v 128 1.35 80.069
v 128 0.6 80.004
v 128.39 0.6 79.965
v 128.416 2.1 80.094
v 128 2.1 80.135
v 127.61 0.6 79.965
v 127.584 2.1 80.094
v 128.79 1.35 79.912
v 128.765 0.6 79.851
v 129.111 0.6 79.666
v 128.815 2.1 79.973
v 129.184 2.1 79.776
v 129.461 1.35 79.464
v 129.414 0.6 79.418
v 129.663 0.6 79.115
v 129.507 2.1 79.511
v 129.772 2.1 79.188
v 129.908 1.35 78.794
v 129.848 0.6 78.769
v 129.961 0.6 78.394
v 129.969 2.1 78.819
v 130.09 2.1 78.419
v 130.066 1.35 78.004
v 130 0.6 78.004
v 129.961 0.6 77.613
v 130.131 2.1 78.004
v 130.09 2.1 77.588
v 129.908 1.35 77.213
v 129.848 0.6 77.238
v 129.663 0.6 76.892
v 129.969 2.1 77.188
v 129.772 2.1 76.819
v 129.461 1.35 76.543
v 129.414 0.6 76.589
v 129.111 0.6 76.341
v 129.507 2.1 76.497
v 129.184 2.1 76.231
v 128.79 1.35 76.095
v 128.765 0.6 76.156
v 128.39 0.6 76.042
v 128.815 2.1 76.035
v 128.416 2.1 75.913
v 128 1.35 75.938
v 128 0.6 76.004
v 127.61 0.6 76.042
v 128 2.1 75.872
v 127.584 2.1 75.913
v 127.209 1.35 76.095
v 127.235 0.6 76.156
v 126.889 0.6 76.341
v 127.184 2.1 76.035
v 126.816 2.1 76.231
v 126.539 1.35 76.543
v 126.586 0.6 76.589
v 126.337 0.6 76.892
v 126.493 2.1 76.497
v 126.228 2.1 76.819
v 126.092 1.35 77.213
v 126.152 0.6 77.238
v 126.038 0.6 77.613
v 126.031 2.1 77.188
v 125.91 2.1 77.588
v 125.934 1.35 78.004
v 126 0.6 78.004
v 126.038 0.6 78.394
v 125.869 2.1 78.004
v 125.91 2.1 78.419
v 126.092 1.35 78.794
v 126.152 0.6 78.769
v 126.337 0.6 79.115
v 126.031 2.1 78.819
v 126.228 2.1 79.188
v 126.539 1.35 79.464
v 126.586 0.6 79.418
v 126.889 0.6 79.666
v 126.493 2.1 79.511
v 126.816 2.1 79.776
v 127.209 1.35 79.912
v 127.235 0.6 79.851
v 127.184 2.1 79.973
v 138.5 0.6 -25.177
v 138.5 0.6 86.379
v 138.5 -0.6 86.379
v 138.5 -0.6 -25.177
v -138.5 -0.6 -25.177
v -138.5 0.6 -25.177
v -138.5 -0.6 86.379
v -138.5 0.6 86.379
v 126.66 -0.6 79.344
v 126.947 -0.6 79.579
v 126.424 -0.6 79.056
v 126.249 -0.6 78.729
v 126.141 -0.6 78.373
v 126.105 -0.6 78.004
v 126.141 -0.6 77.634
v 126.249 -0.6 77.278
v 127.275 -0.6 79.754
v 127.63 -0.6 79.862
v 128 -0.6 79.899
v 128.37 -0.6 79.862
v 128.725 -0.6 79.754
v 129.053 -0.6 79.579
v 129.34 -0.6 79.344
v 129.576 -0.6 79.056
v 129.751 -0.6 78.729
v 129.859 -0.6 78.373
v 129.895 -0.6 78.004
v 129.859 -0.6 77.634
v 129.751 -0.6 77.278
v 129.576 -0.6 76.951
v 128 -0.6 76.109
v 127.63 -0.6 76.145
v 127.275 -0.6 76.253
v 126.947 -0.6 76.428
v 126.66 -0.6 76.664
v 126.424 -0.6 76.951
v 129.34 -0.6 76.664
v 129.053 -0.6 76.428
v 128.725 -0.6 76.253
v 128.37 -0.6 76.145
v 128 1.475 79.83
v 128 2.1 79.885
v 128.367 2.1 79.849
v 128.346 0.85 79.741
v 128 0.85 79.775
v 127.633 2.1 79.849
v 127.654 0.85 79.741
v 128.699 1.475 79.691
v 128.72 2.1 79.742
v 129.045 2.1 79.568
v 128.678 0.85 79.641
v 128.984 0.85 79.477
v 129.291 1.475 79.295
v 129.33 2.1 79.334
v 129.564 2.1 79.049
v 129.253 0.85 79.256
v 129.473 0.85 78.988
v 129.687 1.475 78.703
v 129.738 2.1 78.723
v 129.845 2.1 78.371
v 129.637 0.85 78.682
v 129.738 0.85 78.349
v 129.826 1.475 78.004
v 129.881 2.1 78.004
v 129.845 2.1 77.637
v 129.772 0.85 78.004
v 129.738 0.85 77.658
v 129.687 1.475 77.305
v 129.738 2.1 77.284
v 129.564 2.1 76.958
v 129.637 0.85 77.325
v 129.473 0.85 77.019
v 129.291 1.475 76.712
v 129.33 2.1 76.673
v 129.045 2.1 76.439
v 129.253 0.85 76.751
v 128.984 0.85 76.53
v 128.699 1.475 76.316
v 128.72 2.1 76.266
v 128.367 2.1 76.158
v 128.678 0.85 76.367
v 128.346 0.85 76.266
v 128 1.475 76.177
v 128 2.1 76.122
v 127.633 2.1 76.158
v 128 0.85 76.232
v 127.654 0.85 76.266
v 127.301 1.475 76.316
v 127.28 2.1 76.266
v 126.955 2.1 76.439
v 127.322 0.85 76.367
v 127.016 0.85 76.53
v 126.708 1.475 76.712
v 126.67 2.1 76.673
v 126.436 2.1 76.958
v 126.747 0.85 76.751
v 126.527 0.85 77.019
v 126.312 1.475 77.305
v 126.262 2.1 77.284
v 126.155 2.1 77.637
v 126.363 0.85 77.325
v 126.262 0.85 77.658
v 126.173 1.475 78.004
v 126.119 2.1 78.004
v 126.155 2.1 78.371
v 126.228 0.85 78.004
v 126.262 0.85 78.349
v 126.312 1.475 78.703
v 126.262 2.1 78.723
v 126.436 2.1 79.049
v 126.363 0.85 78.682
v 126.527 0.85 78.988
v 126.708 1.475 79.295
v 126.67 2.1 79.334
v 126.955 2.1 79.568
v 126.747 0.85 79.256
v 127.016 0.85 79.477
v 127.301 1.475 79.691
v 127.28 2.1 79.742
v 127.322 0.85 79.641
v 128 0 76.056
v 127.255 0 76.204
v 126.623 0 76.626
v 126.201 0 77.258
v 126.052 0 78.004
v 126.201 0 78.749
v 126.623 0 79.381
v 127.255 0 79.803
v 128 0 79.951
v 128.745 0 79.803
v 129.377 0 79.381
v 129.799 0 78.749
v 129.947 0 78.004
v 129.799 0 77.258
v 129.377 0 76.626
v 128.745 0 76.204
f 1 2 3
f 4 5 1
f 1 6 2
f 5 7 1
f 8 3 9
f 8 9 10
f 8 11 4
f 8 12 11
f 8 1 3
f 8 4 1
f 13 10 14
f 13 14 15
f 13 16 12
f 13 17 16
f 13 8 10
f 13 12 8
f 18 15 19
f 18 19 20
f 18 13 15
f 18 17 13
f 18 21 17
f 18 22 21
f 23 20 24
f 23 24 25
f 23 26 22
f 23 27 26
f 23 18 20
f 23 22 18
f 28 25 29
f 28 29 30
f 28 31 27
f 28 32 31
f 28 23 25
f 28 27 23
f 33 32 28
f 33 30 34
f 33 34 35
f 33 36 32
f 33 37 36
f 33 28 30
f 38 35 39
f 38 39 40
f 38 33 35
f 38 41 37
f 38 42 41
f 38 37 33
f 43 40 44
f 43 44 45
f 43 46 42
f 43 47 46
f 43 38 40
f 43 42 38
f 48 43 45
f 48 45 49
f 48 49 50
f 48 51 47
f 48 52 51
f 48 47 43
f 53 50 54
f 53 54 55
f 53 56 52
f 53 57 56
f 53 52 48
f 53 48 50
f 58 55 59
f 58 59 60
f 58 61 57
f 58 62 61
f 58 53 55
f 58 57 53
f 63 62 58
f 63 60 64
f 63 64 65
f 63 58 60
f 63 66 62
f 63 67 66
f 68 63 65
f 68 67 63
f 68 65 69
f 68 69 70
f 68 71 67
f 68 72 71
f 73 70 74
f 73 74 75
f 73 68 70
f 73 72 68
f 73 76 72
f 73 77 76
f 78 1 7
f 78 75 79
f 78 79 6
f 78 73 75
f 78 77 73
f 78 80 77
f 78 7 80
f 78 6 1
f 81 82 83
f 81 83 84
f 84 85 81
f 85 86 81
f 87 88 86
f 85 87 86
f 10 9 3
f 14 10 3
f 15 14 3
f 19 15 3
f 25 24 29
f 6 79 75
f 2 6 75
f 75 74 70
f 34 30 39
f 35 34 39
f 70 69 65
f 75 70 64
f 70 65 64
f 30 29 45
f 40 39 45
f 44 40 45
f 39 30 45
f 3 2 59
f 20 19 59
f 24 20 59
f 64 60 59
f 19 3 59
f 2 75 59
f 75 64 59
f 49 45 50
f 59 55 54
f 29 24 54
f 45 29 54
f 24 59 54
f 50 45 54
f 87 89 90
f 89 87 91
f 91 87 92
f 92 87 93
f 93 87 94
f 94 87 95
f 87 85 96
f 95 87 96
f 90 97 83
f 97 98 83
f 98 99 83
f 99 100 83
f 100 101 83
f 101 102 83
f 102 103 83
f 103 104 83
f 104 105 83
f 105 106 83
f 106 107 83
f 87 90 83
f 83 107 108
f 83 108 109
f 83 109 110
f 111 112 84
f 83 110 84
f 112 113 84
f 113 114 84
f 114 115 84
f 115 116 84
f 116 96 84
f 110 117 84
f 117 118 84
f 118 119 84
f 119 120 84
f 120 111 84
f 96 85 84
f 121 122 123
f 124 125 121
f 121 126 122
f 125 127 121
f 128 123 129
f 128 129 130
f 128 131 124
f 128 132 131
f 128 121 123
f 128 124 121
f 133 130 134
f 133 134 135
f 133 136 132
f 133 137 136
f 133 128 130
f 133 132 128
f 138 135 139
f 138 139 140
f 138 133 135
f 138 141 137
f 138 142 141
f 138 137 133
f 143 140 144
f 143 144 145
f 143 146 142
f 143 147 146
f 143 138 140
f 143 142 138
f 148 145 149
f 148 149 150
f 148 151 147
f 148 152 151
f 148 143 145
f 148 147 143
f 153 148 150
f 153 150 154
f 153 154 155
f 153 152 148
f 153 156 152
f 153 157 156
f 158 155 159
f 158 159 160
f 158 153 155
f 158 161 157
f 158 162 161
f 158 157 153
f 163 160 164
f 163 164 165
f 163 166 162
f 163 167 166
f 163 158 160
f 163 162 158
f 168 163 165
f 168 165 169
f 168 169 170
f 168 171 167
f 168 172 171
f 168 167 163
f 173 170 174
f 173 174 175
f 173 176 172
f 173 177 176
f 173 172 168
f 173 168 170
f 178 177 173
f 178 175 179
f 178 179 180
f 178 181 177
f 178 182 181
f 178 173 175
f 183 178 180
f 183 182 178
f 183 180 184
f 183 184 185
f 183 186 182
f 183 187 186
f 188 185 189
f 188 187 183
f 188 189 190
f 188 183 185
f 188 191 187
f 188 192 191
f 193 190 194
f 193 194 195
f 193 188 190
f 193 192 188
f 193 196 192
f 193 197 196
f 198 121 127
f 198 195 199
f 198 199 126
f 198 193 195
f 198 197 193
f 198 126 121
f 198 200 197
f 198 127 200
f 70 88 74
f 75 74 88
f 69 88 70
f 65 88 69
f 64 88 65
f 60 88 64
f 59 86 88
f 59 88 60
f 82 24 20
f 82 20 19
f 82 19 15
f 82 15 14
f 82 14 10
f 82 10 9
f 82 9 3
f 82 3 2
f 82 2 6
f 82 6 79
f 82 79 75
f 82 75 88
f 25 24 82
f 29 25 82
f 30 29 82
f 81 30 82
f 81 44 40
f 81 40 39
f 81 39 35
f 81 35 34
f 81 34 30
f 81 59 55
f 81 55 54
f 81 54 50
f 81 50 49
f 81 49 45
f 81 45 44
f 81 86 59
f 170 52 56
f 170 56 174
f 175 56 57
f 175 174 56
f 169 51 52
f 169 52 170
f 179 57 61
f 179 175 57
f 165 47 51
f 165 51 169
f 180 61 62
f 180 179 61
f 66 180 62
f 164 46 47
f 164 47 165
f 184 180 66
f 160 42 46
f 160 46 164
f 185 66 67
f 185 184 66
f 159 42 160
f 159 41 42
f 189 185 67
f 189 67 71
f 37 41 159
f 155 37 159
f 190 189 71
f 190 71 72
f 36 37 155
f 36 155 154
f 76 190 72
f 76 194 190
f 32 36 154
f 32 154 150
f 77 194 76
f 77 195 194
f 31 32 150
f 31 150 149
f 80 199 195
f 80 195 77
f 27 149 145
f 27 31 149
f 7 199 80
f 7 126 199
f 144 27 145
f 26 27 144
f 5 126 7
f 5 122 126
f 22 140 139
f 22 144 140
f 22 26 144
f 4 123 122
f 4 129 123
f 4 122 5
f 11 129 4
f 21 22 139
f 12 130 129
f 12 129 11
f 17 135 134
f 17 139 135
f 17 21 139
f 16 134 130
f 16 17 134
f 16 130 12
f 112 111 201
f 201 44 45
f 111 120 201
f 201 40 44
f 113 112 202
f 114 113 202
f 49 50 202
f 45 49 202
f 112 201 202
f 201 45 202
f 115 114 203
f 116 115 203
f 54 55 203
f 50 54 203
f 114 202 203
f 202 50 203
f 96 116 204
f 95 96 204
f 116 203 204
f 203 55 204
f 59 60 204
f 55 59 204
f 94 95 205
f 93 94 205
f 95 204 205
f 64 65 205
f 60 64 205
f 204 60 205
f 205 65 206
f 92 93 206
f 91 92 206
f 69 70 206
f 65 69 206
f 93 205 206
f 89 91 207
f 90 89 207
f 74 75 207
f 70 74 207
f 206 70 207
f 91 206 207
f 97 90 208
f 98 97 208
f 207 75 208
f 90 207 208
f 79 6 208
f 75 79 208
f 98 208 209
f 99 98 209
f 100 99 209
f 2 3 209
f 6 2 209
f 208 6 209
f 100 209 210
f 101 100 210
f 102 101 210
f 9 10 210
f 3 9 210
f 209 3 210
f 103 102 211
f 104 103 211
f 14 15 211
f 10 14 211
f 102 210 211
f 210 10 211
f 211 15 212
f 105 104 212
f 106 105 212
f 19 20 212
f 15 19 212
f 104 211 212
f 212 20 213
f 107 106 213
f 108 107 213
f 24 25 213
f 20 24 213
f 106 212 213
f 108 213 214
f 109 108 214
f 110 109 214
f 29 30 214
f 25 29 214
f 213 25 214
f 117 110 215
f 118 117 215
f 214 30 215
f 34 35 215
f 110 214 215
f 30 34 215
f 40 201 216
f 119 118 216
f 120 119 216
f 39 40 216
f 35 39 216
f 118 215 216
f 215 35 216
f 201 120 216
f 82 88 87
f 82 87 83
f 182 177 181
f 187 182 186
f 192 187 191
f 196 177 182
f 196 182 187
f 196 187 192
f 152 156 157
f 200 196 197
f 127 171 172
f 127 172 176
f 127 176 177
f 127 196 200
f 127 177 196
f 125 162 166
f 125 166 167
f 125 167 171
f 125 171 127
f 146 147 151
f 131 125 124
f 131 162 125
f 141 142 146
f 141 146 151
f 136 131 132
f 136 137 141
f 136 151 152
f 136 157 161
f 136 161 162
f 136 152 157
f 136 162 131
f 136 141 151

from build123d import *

# Parameters (mm, degrees)
SKETCH1_W           = 276.99982026
SKETCH1_H           = 111.55517974
BOSS_EXTRUDE1_DEPTH = 0.6


with BuildPart() as part:
    # Sketch1 → Boss-Extrude1 (new, symmetric)
    with BuildSketch(Plane(origin=(0, 0, 0), x_dir=(1, 0, 0), z_dir=(0, 1, 0))):
        with Locations((-1.3e-07, -30.600952381)):
            Rectangle(SKETCH1_W, SKETCH1_H)
    extrude(amount=BOSS_EXTRUDE1_DEPTH, both=True)

    # Sketch2 → Revolve1 (revolve)
    with BuildSketch(Plane(origin=(0, 0, 78.003542251), x_dir=(-1, 0, 0), z_dir=(0, 0, -1)), mode=Mode.PRIVATE) as revolve1_sk:
        Polygon((-127.99991, 0.6), (-125.99991, 0.6), (-125.868677005, 2.1), (-126.118677005, 2.1), (-126.228037834, 0.85), (-127.99991, 0.85), align=None)
    revolve(revolve1_sk.sketch.rotate(Axis((127.99991, -51.532801272, 78.003542251), (0, 1, 0)), 90), axis=Axis((127.99991, -51.532801272, 78.003542251), (0, 1, 0)))

    # Sketch4 → Cut-Revolve1 (revolve, cut)
    with BuildSketch(Plane(origin=(0, 0, 78.003542251), x_dir=(-1, 0, 0), z_dir=(0, 0, -1)), mode=Mode.PRIVATE) as cut_revolve1_sk:
        Polygon((-129.894923604, -0.6), (-129.99991, 0.6), (-127.99991, 0.6), (-127.99991, -0.6), align=None)
    revolve(cut_revolve1_sk.sketch.rotate(Axis((127.99991, -51.532801272, 78.003542251), (0, 1, 0)), 90), axis=Axis((127.99991, -51.532801272, 78.003542251), (0, 1, 0)), mode=Mode.SUBTRACT)


with BuildPart() as cut_revolve1_piece_1:
    # of the separate pieces the step leaves, piece 1, a body of its own (cut_revolve1_pieces)
    add(part.part.solids().sort_by_distance((138.49991, -0.6, 86.378542251))[0])


with BuildPart() as cut_revolve1_piece_2:
    # of the separate pieces the step leaves, piece 2, a body of its own (cut_revolve1_pieces)
    add(part.part.solids().sort_by_distance((127.99991, 2.1, 80.134775246))[0])


solid = Compound([cut_revolve1_piece_1.part, cut_revolve1_piece_2.part])
